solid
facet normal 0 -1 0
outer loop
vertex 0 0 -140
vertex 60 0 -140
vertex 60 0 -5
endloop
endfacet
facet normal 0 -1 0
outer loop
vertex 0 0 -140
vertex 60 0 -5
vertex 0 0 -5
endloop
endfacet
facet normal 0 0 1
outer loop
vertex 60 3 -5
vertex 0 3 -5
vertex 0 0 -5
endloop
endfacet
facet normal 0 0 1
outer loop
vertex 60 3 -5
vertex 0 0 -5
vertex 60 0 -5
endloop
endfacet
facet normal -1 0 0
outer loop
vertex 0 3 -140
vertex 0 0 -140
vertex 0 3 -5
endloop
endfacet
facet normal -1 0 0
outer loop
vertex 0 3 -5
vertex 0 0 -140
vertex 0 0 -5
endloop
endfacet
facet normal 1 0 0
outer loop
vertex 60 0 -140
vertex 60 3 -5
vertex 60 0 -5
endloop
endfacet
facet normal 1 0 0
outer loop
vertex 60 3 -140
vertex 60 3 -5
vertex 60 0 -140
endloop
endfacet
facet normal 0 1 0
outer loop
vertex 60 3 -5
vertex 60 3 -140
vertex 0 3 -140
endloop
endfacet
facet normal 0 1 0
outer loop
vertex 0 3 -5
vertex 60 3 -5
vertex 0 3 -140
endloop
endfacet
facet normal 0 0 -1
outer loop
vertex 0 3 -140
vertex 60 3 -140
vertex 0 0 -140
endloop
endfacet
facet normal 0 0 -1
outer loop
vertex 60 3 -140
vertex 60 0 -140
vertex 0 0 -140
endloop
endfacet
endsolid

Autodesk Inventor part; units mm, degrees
ref_plane "YZ Plane" through (0, 0, 0) normal (1, 0, 0) x (0, 1, 0)
ref_plane "XZ Plane" through (0, 0, 0) normal (0, 1, 0) x (-1, 0, 0)
ref_plane "XY Plane" through (0, 0, 0) normal (0, 0, 1) x (1, 0, 0)
sketch "Boceto1" plane through (0, 0, 0) normal (0, 1, 0) x (-1, 0, 0)
  line L0 (0, 0) -> (-64, 0)
  line L1 (-64, 0) -> (-64, -140)
  line L2 (-64, -140) -> (0, -140)
  line L3 (0, -140) -> (0, 0)
  dimension "d0" = 64
  dimension "d1" = 140
extrude "Extrusión1" add sketch "Boceto1" along normal blind 3
sketch "Boceto2" plane through (64, 0, 0) normal (1, 0, 0) x (0, 0, -1)
  line L0 (0, 0) -> (140, 0) projected
  line L1 (140, 0) -> (140, 3) projected
  line L2 (0, 3) -> (140, 3) projected
  line L3 (0, 0) -> (0, 3) projected
extrude "Extrusión2" cut sketch "Boceto2" against normal blind 4
sketch "Boceto3" plane through (0, 0, 0) normal (0, 0, 1) x (1, 0, 0)
  line L0 (60, 0) -> (60, 3) projected
  line L1 (0, 3) -> (60, 3) projected
  line L2 (0, 0) -> (0, 3) projected
  line L3 (0, 0) -> (60, 0) projected
extrude "Extrusión3" cut sketch "Boceto3" along normal blind 5
sketch "Boceto4" plane through (0, 0, 0) normal (0, 0, 1) x (1, 0, 0)
  line L0 (60, 0) -> (60, 3) projected
  line L1 (0, 3) -> (60, 3) projected
  line L2 (0, 0) -> (0, 3) projected
  line L3 (0, 0) -> (60, 0) projected
extrude "Extrusión4" cut sketch "Boceto4" against normal blind 5
properties part number "laterales"
